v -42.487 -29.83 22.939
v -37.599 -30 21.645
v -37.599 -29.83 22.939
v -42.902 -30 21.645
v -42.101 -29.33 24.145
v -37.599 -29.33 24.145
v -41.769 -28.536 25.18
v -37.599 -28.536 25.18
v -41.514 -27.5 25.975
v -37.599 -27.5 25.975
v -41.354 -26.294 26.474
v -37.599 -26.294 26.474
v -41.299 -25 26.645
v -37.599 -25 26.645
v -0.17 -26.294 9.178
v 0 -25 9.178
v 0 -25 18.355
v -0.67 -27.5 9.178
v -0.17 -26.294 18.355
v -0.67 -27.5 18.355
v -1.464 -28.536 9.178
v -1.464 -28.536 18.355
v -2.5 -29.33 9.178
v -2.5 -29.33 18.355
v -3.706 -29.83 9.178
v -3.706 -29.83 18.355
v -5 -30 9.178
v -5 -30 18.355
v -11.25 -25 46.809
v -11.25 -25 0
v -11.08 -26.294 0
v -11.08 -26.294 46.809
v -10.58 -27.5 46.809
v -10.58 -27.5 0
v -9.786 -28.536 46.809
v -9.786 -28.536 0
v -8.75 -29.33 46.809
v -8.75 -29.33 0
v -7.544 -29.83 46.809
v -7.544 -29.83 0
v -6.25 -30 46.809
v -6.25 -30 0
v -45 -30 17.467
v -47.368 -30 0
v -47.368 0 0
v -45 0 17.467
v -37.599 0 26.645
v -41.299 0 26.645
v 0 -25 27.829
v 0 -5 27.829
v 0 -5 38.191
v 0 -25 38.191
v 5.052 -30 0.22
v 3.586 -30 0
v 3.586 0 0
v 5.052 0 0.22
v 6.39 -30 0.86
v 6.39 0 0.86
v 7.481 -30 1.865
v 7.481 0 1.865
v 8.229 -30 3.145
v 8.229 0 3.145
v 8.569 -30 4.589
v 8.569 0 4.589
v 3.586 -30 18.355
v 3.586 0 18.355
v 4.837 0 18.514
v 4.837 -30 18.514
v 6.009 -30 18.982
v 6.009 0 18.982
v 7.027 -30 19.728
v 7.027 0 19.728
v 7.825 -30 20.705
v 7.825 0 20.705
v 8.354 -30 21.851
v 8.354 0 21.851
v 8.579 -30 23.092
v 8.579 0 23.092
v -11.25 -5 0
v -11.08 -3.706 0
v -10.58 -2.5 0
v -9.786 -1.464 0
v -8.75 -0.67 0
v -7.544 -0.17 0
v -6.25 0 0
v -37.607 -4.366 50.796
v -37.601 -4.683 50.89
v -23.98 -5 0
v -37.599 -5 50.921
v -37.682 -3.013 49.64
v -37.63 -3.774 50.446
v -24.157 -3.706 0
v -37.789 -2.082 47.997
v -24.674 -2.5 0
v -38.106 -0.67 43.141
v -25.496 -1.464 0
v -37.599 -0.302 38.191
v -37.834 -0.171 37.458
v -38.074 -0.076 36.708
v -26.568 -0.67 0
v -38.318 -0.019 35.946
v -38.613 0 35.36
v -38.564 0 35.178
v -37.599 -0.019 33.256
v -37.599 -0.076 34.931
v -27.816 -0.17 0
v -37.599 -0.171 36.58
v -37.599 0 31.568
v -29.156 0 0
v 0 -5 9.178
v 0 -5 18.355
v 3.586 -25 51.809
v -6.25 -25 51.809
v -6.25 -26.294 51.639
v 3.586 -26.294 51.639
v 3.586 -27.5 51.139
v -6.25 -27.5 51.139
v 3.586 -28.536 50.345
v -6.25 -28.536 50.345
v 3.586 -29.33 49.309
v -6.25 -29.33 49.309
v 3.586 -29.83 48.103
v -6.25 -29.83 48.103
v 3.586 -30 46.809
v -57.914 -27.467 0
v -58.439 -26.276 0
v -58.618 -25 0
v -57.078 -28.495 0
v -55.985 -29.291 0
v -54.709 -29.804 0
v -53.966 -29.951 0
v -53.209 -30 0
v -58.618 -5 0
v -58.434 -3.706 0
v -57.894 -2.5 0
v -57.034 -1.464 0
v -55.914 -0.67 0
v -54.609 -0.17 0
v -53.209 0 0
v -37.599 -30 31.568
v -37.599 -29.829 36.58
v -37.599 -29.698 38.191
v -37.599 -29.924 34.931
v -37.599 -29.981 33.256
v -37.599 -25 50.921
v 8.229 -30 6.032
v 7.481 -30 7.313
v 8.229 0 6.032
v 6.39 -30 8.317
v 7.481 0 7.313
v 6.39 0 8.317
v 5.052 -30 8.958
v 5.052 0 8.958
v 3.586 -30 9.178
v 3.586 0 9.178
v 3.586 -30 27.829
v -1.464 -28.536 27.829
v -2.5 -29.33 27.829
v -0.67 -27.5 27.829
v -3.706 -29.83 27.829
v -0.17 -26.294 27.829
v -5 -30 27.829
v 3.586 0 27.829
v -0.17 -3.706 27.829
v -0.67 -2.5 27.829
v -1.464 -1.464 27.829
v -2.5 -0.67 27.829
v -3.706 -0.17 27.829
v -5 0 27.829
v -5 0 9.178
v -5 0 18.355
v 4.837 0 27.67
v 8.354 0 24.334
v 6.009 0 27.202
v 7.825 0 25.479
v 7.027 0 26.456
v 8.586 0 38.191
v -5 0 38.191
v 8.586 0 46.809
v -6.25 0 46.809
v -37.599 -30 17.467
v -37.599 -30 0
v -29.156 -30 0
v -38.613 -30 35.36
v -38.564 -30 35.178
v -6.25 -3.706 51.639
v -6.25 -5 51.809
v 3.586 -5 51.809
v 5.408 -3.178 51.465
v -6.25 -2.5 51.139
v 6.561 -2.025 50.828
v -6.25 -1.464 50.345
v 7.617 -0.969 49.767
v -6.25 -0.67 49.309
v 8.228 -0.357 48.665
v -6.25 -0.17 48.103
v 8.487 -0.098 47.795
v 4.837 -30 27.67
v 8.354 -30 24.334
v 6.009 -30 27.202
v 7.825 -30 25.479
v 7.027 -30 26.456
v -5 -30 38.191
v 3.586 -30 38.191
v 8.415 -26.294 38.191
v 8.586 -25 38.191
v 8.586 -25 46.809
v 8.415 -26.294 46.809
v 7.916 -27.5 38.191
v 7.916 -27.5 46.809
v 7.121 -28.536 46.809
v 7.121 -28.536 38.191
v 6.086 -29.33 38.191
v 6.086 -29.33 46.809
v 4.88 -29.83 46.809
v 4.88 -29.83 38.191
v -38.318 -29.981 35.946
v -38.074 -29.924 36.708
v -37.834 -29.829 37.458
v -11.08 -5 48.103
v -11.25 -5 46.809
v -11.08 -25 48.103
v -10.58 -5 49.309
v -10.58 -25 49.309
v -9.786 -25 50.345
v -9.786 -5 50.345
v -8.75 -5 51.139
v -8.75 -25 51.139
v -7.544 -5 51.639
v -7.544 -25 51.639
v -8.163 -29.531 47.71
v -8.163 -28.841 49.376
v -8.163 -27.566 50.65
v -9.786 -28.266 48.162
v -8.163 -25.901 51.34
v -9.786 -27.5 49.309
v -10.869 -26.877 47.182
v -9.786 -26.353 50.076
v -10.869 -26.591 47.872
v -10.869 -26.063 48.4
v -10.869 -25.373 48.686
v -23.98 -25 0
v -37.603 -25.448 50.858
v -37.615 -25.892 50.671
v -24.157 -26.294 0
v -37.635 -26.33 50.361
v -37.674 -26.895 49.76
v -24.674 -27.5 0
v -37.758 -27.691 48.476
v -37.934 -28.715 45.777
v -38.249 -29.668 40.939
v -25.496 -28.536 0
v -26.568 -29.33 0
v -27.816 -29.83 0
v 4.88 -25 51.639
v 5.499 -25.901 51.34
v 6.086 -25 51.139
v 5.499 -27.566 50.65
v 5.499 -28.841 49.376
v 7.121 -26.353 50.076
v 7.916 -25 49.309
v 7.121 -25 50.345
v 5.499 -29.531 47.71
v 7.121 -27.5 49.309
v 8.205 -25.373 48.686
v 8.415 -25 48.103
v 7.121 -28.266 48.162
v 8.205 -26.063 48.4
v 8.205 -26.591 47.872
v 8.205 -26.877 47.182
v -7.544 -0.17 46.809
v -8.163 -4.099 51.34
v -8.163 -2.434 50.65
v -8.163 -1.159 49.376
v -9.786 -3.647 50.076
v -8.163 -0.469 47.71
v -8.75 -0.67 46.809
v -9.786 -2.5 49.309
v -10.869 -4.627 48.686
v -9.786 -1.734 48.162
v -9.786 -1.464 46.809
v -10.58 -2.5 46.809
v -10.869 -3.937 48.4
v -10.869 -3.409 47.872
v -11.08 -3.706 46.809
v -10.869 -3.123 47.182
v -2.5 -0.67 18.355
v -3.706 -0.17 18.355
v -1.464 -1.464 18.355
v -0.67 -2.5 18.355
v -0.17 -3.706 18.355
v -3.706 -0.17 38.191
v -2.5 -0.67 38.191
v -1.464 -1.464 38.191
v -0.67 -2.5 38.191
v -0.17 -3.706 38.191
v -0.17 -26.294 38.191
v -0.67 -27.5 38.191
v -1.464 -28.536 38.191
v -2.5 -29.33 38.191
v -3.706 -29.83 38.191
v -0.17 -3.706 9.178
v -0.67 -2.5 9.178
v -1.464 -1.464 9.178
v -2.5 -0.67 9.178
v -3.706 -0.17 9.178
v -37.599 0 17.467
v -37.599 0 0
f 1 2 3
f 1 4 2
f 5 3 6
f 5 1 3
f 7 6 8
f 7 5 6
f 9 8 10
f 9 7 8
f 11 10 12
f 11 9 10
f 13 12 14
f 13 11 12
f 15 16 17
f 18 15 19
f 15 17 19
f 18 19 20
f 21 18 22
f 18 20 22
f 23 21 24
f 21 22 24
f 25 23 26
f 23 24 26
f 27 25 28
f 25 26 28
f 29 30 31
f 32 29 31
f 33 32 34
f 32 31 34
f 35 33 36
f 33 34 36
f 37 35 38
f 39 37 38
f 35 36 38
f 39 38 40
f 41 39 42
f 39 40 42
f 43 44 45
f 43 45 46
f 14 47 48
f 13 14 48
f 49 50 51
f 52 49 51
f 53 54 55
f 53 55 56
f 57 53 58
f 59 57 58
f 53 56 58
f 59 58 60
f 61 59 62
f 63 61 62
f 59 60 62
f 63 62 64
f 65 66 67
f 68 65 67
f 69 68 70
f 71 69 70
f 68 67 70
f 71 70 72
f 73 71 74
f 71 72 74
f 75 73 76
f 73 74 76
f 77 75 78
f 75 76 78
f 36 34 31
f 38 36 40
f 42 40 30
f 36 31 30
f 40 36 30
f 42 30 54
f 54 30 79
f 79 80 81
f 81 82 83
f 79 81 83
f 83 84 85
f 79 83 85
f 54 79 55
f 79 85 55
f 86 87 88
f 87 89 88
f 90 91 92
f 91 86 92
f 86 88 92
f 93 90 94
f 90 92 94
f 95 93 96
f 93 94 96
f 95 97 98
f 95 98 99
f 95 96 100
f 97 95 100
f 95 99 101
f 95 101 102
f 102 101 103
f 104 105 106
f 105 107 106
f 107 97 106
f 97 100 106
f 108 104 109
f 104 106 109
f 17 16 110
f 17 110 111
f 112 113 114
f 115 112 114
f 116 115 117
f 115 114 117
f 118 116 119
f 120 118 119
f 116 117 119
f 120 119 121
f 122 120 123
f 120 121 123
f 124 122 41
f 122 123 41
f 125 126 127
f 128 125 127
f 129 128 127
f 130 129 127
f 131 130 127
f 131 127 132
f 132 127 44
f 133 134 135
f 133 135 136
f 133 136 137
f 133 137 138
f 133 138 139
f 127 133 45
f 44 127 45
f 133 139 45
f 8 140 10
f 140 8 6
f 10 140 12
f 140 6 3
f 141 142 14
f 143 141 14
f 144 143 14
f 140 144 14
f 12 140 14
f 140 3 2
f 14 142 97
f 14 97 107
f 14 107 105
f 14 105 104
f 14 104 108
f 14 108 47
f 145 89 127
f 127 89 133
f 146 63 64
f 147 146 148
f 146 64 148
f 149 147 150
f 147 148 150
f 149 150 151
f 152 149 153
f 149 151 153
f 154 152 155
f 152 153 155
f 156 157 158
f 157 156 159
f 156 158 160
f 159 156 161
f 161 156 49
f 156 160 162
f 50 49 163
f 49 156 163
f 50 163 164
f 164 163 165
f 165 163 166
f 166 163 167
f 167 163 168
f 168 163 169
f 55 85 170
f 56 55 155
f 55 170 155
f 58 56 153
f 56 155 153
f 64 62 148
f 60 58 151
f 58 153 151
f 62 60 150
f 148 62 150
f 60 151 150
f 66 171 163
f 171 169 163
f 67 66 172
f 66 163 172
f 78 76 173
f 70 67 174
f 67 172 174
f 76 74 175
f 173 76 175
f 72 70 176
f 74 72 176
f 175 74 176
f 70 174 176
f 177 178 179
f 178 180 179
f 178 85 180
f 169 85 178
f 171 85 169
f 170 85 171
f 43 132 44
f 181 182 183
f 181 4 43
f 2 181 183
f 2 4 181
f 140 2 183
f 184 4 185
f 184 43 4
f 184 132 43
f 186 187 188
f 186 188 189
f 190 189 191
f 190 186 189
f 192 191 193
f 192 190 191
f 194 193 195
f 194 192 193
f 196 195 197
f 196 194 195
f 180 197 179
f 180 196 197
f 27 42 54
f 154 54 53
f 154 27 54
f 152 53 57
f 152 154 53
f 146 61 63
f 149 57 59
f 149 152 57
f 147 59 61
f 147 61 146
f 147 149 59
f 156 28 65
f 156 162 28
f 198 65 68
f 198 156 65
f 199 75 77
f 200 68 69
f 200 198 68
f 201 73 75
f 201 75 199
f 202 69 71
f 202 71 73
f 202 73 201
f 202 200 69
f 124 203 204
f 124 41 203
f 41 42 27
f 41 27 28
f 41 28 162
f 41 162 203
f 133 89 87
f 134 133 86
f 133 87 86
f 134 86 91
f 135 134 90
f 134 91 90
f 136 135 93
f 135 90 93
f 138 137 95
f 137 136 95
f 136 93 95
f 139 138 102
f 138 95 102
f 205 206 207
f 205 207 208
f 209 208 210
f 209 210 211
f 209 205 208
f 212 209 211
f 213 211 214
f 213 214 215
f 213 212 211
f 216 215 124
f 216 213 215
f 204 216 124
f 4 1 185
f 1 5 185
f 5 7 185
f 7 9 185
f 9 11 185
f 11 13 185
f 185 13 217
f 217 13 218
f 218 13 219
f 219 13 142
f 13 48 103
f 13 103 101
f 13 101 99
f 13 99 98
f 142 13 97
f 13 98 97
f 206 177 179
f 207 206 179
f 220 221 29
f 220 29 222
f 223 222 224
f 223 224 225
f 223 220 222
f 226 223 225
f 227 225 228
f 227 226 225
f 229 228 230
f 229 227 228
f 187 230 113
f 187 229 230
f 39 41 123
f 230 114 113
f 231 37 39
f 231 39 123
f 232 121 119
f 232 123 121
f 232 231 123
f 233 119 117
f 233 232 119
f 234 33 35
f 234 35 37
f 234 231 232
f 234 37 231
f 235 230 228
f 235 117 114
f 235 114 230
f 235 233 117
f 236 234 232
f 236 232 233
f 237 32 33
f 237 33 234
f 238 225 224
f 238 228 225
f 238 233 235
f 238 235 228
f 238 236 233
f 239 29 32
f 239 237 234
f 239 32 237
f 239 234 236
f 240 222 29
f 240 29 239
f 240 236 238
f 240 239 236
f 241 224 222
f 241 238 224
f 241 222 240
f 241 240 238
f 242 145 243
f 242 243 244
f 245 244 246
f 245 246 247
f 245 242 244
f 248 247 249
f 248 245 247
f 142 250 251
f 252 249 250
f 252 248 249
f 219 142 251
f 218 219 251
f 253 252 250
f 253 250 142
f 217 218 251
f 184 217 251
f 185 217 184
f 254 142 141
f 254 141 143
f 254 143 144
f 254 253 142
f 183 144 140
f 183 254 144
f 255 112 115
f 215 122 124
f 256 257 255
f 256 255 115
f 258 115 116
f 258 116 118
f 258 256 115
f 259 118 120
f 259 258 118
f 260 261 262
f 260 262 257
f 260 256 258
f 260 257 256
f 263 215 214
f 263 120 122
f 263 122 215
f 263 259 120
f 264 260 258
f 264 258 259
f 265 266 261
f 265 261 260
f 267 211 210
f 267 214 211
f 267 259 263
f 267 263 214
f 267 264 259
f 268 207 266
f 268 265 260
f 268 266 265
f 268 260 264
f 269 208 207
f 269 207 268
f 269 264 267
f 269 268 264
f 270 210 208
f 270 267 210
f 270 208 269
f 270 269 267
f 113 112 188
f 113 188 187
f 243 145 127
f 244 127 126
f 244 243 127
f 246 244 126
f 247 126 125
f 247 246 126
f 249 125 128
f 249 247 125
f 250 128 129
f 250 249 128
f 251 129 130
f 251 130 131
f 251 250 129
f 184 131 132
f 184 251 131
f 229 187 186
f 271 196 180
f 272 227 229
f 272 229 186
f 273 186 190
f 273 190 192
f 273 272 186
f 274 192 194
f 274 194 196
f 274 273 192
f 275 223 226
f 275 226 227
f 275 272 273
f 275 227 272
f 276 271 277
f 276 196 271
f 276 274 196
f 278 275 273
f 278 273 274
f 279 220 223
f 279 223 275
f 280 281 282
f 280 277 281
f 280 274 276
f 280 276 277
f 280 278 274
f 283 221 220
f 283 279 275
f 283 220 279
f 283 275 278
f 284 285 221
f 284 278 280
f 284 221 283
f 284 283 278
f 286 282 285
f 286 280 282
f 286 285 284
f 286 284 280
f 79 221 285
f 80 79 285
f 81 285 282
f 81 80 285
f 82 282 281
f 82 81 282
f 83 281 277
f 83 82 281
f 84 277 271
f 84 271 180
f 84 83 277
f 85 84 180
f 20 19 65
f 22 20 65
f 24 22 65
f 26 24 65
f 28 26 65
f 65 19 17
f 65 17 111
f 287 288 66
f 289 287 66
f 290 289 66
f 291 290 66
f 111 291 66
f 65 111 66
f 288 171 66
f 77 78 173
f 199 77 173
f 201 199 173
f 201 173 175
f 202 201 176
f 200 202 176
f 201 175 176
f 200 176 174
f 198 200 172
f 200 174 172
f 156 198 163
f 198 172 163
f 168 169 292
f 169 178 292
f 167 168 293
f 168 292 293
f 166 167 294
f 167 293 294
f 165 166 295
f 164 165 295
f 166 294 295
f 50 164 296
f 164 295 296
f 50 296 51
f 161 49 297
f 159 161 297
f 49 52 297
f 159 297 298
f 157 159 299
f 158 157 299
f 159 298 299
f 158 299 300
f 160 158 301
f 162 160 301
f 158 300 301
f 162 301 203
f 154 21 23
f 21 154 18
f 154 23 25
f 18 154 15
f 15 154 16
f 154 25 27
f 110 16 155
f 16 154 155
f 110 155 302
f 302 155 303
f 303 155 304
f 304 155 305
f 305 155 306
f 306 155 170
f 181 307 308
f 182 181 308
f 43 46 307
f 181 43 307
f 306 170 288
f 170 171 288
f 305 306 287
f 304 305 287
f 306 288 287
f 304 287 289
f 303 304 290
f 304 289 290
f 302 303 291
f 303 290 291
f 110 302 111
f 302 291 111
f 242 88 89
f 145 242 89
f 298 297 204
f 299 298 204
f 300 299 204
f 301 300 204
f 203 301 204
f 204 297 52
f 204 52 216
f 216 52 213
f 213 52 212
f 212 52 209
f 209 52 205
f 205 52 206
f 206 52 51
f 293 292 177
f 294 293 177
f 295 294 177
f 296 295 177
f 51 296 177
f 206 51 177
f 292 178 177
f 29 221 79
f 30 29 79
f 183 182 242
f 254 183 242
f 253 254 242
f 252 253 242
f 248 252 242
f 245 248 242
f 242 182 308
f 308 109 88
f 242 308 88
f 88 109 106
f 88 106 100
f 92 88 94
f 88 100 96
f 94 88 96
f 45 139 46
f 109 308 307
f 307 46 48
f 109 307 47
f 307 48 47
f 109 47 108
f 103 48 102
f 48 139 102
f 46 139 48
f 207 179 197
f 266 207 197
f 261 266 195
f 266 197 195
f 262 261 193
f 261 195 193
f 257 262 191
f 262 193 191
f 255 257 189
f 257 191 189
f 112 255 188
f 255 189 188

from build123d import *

# Parameters (mm, degrees)
F1_DEPTH       = 30
F2_T1_DEPTH    = 80.0888645747
F2_T3_DEPTH    = 77.7106724757
F2_2_T1_DEPTH  = 46.8092103302
F2_2_T3_DEPTH  = 14.835527055
F2_2_T5_DEPTH  = 9.835527055
F2_2_T7_DEPTH  = 20
F2_2_T9_DEPTH  = 8.6184208095
F2_2_T11_DEPTH = 25
F2_2_T13_DEPTH = 30
F2_2_S17_W     = 5.1
F2_2_S17_H     = 5.1
F2_2_T18_DEPTH = 5.1
F2_2_S23_W     = 5.1
F2_2_S23_H     = 5.1
F2_2_T24_DEPTH = 5.1
F2_2_S29_W     = 5.1
F2_2_S29_H     = 5.1
F2_2_T30_DEPTH = 5.1
F2_2_T37_DEPTH = 37.5
F2_2_T41_DEPTH = 27.335527055
F3_R           = 5
F3_2_R         = 5


# Not quite as in the source:
# - a fillet or chamfer that OpenCascade refuses, or shapes differently, is made with other operations: its cross-section is extruded or revolved along the edge and cut away or added


with BuildPart() as f1:
    # F0 (on Front) → F1 (new body)
    with BuildSketch(Plane.XZ):
        Polygon((-37.5986844301, 50.9210526943), (-58.6184225976, 0), (-47.3684221506, 0), (-45.0000017881, 17.4671057612), (-37.5986844301, 17.4671057612), (-37.5986844301, 0), (-23.9802636206, 0), align=None)
        Polygon((-37.5986844301, 26.6447365284), (-41.2993431091, 26.6447365284), (-37.5986844301, 38.1907895207), align=None, mode=Mode.SUBTRACT)
    extrude(amount=F1_DEPTH)

    # F2: fillet of radius 5 on 4 edges, made by hand

    # F2_s2 → F2_t1 (cut)
    with BuildSketch(Plane(origin=(17.2550791502, 0, 41.8010342303), x_dir=(0, 1, 0), z_dir=(-0.3815605627, 0, -0.9243438413))):
        with BuildLine():
            ThreePointArc((-25, -54.1835779154), (-28.5355339059, -52.7191118213), (-30, -49.1835779154))
            Line((-30, -49.1835779154), (-30, -54.1835779154))
            Line((-30, -54.1835779154), (-25, -54.1835779154))
        make_face()
        with BuildLine():
            ThreePointArc((-5, -54.1835779154), (-1.4644660941, -52.7191118213), (0, -49.1835779154))
            Line((0, -49.1835779154), (0, -54.1835779154))
            Line((0, -54.1835779154), (-5, -54.1835779154))
        make_face()
    extrude(amount=F2_T1_DEPTH, mode=Mode.SUBTRACT)

    # F2_s4 → F2_t3 (cut)
    with BuildSketch(Plane(origin=(1.6288202397, 0, -6.0903714472), x_dir=(0, 1, 0), z_dir=(-0.2583617353, 0, 0.9660482461))):
        with BuildLine():
            ThreePointArc((-25, 23.166091611), (-28.5355339059, 24.6305577051), (-30, 28.166091611))
            Line((-30, 28.166091611), (-30, 23.166091611))
            Line((-30, 23.166091611), (-25, 23.166091611))
        make_face()
        with BuildLine():
            ThreePointArc((-5, 23.166091611), (-1.4644660941, 24.6305577051), (0, 28.166091611))
            Line((0, 28.166091611), (0, 23.166091611))
            Line((0, 23.166091611), (-5, 23.166091611))
        make_face()
    extrude(amount=F2_T3_DEPTH, mode=Mode.SUBTRACT)

    # F3
    f3_edges = [f1.edges().sort_by_distance(p)[0] for p in [
        (-39.449014, -30, 26.644737),
    ]]
    fillet(f3_edges, radius=F3_R)


with BuildPart() as f1b:
    # F0 (on Front) → F1, piece 2 (new body)
    with BuildSketch(Plane.XZ):
        Polygon((-11.250000447, 51.8092103302), (-11.250000447, 0), (8.5855266079, 0), (8.5855266079, 9.1776316985), (0, 9.1776316985), (0, 18.3552633971), (8.5855266079, 18.3552633971), (8.5855266079, 27.8289485723), (0, 27.8289485723), (0, 38.1907895207), (8.5855266079, 38.1907895207), (8.5855266079, 51.8092103302), align=None)
    extrude(amount=F1_DEPTH)

    # F2#2: fillet of radius 5 on 11 edges, made by hand

    # F2_2_s2 → F2_2_t1 (cut)
    with BuildSketch(Plane.XY):
        with BuildLine():
            ThreePointArc((-11.250000447, -5), (-9.785534353, -1.4644660941), (-6.250000447, 0))
            Line((-6.250000447, 0), (-6.250000447, 0.1))
            Line((-6.250000447, 0.1), (-11.350000447, 0.1))
            Line((-11.350000447, 0.1), (-11.350000447, -5))
            Line((-11.350000447, -5), (-11.250000447, -5))
        make_face()
        with BuildLine():
            ThreePointArc((-11.250000447, -25), (-9.785534353, -28.5355339059), (-6.250000447, -30))
            Line((-6.250000447, -30), (-6.250000447, -30.1))
            Line((-6.250000447, -30.1), (-11.350000447, -30.1))
            Line((-11.350000447, -30.1), (-11.350000447, -25))
            Line((-11.350000447, -25), (-11.250000447, -25))
        make_face()
    extrude(amount=F2_2_T1_DEPTH, mode=Mode.SUBTRACT)

    # F2_2_s4 → F2_2_t3 (cut)
    with BuildSketch(Plane.YZ.offset(-6.250000447)):
        with BuildLine():
            ThreePointArc((-5, 51.8092103302), (-1.4644660941, 50.3447442362), (0, 46.8092103302))
            Line((0, 46.8092103302), (0.1, 46.8092103302))
            Line((0.1, 46.8092103302), (0.1, 51.9092103302))
            Line((0.1, 51.9092103302), (-5, 51.9092103302))
            Line((-5, 51.9092103302), (-5, 51.8092103302))
        make_face()
    extrude(amount=F2_2_T3_DEPTH, mode=Mode.SUBTRACT)

    # F2_2_s6 → F2_2_t5 (cut)
    with BuildSketch(Plane.YZ.offset(-6.250000447)):
        with BuildLine():
            ThreePointArc((-25, 51.8092103302), (-28.5355339059, 50.3447442362), (-30, 46.8092103302))
            Line((-30, 46.8092103302), (-30.1, 46.8092103302))
            Line((-30.1, 46.8092103302), (-30.1, 51.9092103302))
            Line((-30.1, 51.9092103302), (-25, 51.9092103302))
            Line((-25, 51.9092103302), (-25, 51.8092103302))
        make_face()
    extrude(amount=F2_2_T5_DEPTH, mode=Mode.SUBTRACT)

    # F2_2_s8 → F2_2_t7 (cut)
    with BuildSketch(Plane.XZ.offset(5)):
        with BuildLine():
            ThreePointArc((-11.250000447, 46.8092103302), (-9.785534353, 50.3447442362), (-6.250000447, 51.8092103302))
            Line((-6.250000447, 51.8092103302), (-6.250000447, 51.9092103302))
            Line((-6.250000447, 51.9092103302), (-11.350000447, 51.9092103302))
            Line((-11.350000447, 51.9092103302), (-11.350000447, 46.8092103302))
            Line((-11.350000447, 46.8092103302), (-11.250000447, 46.8092103302))
        make_face()
    extrude(amount=F2_2_T7_DEPTH, mode=Mode.SUBTRACT)

    # F2_2_s10 → F2_2_t9 (cut)
    with BuildSketch(Plane.XY.offset(38.1907895207)):
        with BuildLine():
            ThreePointArc((8.5855266079, -25), (7.1210605139, -28.5355339059), (3.5855266079, -30))
            Line((3.5855266079, -30), (3.5855266079, -30.1))
            Line((3.5855266079, -30.1), (8.6855266079, -30.1))
            Line((8.6855266079, -30.1), (8.6855266079, -25))
            Line((8.6855266079, -25), (8.5855266079, -25))
        make_face()
    extrude(amount=F2_2_T9_DEPTH, mode=Mode.SUBTRACT)

    # F2_2_s12 → F2_2_t11 (cut)
    with BuildSketch(Plane.XZ):
        with BuildLine():
            ThreePointArc((8.5855266079, 46.8092103302), (7.1210605139, 50.3447442362), (3.5855266079, 51.8092103302))
            Line((3.5855266079, 51.8092103302), (3.5855266079, 51.9092103302))
            Line((3.5855266079, 51.9092103302), (8.6855266079, 51.9092103302))
            Line((8.6855266079, 51.9092103302), (8.6855266079, 46.8092103302))
            Line((8.6855266079, 46.8092103302), (8.5855266079, 46.8092103302))
        make_face()
    extrude(amount=F2_2_T11_DEPTH, mode=Mode.SUBTRACT)

    # F2_2_s14 → F2_2_t13 (cut)
    with BuildSketch(Plane.XZ):
        with BuildLine():
            ThreePointArc((8.5855266079, 22.8289485723), (7.1210605139, 26.3644824782), (3.5855266079, 27.8289485723))
            Line((3.5855266079, 27.8289485723), (3.5855266079, 27.9289485723))
            Line((3.5855266079, 27.9289485723), (8.6855266079, 27.9289485723))
            Line((8.6855266079, 27.9289485723), (8.6855266079, 22.8289485723))
            Line((8.6855266079, 22.8289485723), (8.5855266079, 22.8289485723))
        make_face()
        with BuildLine():
            ThreePointArc((3.5855266079, 18.3552633971), (7.1210605139, 19.8197294912), (8.5855266079, 23.3552633971))
            Line((8.5855266079, 23.3552633971), (8.6855266079, 23.3552633971))
            Line((8.6855266079, 23.3552633971), (8.6855266079, 18.2552633971))
            Line((8.6855266079, 18.2552633971), (3.5855266079, 18.2552633971))
            Line((3.5855266079, 18.2552633971), (3.5855266079, 18.3552633971))
        make_face()
        with BuildLine():
            ThreePointArc((8.5855266079, 4.1776316985), (7.1210605139, 7.7131656045), (3.5855266079, 9.1776316985))
            Line((3.5855266079, 9.1776316985), (3.5855266079, 9.2776316985))
            Line((3.5855266079, 9.2776316985), (8.6855266079, 9.2776316985))
            Line((8.6855266079, 9.2776316985), (8.6855266079, 4.1776316985))
            Line((8.6855266079, 4.1776316985), (8.5855266079, 4.1776316985))
        make_face()
        with BuildLine():
            ThreePointArc((3.5855266079, 0), (7.1210605139, 1.4644660941), (8.5855266079, 5))
            Line((8.5855266079, 5), (8.6855266079, 5))
            Line((8.6855266079, 5), (8.6855266079, -0.1))
            Line((8.6855266079, -0.1), (3.5855266079, -0.1))
            Line((3.5855266079, -0.1), (3.5855266079, 0))
        make_face()
    extrude(amount=F2_2_T13_DEPTH, mode=Mode.SUBTRACT)


with BuildPart() as f2_2_tool16:
    # F2_2_s17 → F2_2_t18 (new body)
    with BuildSketch(Plane.YZ.offset(-6.250000447)):
        with Locations((-2.45, 49.3592103302)):
            Rectangle(F2_2_S17_W, F2_2_S17_H)
    extrude(amount=-F2_2_T18_DEPTH)

    # F2_2_s19 → F2_2_t20 (revolve, cut)
    with BuildSketch(Plane(origin=(-6.250000447, -5, 46.8092103302), x_dir=(0, -0.7071067812, -0.7071067812), z_dir=(0, 0.7071067812, -0.7071067812))):
        with BuildLine():
            ThreePointArc((0, -5), (5, 0), (0, 5))
            Line((0, 5), (0, -5))
        make_face()
    revolve(axis=Axis((-6.250000447, -5, 46.8092103302), (-1, 0, 0)), mode=Mode.SUBTRACT)


with BuildPart() as f1b_1:
    add(f1b.part)

    # F2_2_t15: cut F2_2_tool16
    add(f2_2_tool16.part, mode=Mode.SUBTRACT)


with BuildPart() as f2_2_tool22:
    # F2_2_s23 → F2_2_t24 (new body)
    with BuildSketch(Plane.YZ.offset(3.5855266079)):
        with Locations((-27.55, 49.3592103302)):
            Rectangle(F2_2_S23_W, F2_2_S23_H)
    extrude(amount=F2_2_T24_DEPTH)

    # F2_2_s25 → F2_2_t26 (revolve, cut)
    with BuildSketch(Plane(origin=(3.5855266079, -25, 46.8092103302), x_dir=(0, 0.7071067812, -0.7071067812), z_dir=(0, -0.7071067812, -0.7071067812))):
        with BuildLine():
            ThreePointArc((0, -5), (5, 0), (0, 5))
            Line((0, 5), (0, -5))
        make_face()
    revolve(axis=Axis((3.5855266079, -25, 46.8092103302), (1, 0, 0)), mode=Mode.SUBTRACT)


with BuildPart() as f1b_2:
    add(f1b_1.part)

    # F2_2_t21: cut F2_2_tool22
    add(f2_2_tool22.part, mode=Mode.SUBTRACT)


with BuildPart() as f2_2_tool28:
    # F2_2_s29 → F2_2_t30 (new body)
    with BuildSketch(Plane.YZ.offset(-6.250000447)):
        with Locations((-27.55, 49.3592103302)):
            Rectangle(F2_2_S29_W, F2_2_S29_H)
    extrude(amount=-F2_2_T30_DEPTH)

    # F2_2_s31 → F2_2_t32 (revolve, cut)
    with BuildSketch(Plane(origin=(-6.250000447, -25, 46.8092103302), x_dir=(0, 0.7071067812, -0.7071067812), z_dir=(0, 0.7071067812, 0.7071067812))):
        with BuildLine():
            ThreePointArc((0, -5), (5, 0), (0, 5))
            Line((0, 5), (0, -5))
        make_face()
    revolve(axis=Axis((-6.250000447, -25, 46.8092103302), (-1, 0, 0)), mode=Mode.SUBTRACT)


with BuildPart() as f1b_3:
    add(f1b_2.part)

    # F2_2_t27: cut F2_2_tool28
    add(f2_2_tool28.part, mode=Mode.SUBTRACT)


with BuildPart() as f2_2_tool35:
    # F2_2_s36 → F2_2_t37 (new body)
    with BuildSketch(Plane.XZ.offset(-12.5)):
        with BuildLine():
            ThreePointArc((8.5855266079, 46.8092103302), (7.1210605139, 50.3447442362), (3.5855266079, 51.8092103302))
            Line((3.5855266079, 51.8092103302), (3.5855266079, 51.9092103302))
            Line((3.5855266079, 51.9092103302), (8.6855266079, 51.9092103302))
            Line((8.6855266079, 51.9092103302), (8.6855266079, 46.8092103302))
            Line((8.6855266079, 46.8092103302), (8.5855266079, 46.8092103302))
        make_face()
    extrude(amount=F2_2_T37_DEPTH)

    split(bisect_by=Plane.XZ, keep=Keep.BOTTOM)


with BuildPart() as f2_2_tool39:
    # F2_2_s40 → F2_2_t41 (new body)
    with BuildSketch(Plane.YZ.offset(21.0855266079)):
        with BuildLine():
            ThreePointArc((-5, 51.8092103302), (-1.4644660941, 50.3447442362), (0, 46.8092103302))
            Line((0, 46.8092103302), (0.1, 46.8092103302))
            Line((0.1, 46.8092103302), (0.1, 51.9092103302))
            Line((0.1, 51.9092103302), (-5, 51.9092103302))
            Line((-5, 51.9092103302), (-5, 51.8092103302))
        make_face()
    extrude(amount=-F2_2_T41_DEPTH)

    split(bisect_by=Plane.YZ.offset(8.5855266079), keep=Keep.TOP)


with BuildPart() as f2_2_tool35_1:
    add(f2_2_tool35.part)

    # F2_2_t43: intersect F2_2_tool39
    add(f2_2_tool39.part, mode=Mode.INTERSECT)


with BuildPart() as f1b_4:
    add(f1b_3.part)

    # F2_2_t33: cut F2_2_tool35
    add(f2_2_tool35_1.part, mode=Mode.SUBTRACT)

    # F3#2
    f3_2_edges = [f1b_4.edges().sort_by_distance(p)[0] for p in [
        (0, 0, 33.009869),
        (0, 0, 13.766448),
        (0, -30, 13.766448),
        (0, -30, 33.009869),
    ]]
    fillet(f3_2_edges, radius=F3_2_R)


solid = Compound([f1.part, f1b_4.part])
